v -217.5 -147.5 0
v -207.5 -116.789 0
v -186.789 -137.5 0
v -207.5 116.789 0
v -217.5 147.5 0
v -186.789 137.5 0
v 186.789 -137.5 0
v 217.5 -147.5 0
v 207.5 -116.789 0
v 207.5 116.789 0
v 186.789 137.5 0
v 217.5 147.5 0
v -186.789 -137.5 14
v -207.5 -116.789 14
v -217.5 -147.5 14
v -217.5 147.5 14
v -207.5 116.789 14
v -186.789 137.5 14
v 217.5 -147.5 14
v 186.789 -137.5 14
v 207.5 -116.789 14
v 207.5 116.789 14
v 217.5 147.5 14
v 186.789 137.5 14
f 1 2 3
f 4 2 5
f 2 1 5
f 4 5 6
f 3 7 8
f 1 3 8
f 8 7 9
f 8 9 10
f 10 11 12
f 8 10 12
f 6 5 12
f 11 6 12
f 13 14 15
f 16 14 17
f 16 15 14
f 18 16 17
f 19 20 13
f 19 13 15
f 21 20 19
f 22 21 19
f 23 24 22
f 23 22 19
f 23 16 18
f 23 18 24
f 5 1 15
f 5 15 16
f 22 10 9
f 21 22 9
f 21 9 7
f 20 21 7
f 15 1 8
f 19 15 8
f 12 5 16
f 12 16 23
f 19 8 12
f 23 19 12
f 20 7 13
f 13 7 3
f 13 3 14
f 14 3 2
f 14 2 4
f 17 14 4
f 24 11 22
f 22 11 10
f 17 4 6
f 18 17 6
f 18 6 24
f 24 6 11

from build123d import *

# Parameters (mm, degrees)
SKETCH_W  = 435
SKETCH_H  = 295
PAD_DEPTH = 14


with BuildPart() as part:
    # Sketch → Pad (new body)
    with BuildSketch(Plane.XY):
        Rectangle(SKETCH_W, SKETCH_H)
        Polygon((186.788842, -137.5), (-186.788842, -137.5), (-207.5, -116.788842), (-207.5, 116.788842), (-186.788842, 137.5), (186.788842, 137.5), (207.5, 116.788842), (207.5, -116.788842), align=None, mode=Mode.SUBTRACT)
    extrude(amount=PAD_DEPTH)


solid = part.part
